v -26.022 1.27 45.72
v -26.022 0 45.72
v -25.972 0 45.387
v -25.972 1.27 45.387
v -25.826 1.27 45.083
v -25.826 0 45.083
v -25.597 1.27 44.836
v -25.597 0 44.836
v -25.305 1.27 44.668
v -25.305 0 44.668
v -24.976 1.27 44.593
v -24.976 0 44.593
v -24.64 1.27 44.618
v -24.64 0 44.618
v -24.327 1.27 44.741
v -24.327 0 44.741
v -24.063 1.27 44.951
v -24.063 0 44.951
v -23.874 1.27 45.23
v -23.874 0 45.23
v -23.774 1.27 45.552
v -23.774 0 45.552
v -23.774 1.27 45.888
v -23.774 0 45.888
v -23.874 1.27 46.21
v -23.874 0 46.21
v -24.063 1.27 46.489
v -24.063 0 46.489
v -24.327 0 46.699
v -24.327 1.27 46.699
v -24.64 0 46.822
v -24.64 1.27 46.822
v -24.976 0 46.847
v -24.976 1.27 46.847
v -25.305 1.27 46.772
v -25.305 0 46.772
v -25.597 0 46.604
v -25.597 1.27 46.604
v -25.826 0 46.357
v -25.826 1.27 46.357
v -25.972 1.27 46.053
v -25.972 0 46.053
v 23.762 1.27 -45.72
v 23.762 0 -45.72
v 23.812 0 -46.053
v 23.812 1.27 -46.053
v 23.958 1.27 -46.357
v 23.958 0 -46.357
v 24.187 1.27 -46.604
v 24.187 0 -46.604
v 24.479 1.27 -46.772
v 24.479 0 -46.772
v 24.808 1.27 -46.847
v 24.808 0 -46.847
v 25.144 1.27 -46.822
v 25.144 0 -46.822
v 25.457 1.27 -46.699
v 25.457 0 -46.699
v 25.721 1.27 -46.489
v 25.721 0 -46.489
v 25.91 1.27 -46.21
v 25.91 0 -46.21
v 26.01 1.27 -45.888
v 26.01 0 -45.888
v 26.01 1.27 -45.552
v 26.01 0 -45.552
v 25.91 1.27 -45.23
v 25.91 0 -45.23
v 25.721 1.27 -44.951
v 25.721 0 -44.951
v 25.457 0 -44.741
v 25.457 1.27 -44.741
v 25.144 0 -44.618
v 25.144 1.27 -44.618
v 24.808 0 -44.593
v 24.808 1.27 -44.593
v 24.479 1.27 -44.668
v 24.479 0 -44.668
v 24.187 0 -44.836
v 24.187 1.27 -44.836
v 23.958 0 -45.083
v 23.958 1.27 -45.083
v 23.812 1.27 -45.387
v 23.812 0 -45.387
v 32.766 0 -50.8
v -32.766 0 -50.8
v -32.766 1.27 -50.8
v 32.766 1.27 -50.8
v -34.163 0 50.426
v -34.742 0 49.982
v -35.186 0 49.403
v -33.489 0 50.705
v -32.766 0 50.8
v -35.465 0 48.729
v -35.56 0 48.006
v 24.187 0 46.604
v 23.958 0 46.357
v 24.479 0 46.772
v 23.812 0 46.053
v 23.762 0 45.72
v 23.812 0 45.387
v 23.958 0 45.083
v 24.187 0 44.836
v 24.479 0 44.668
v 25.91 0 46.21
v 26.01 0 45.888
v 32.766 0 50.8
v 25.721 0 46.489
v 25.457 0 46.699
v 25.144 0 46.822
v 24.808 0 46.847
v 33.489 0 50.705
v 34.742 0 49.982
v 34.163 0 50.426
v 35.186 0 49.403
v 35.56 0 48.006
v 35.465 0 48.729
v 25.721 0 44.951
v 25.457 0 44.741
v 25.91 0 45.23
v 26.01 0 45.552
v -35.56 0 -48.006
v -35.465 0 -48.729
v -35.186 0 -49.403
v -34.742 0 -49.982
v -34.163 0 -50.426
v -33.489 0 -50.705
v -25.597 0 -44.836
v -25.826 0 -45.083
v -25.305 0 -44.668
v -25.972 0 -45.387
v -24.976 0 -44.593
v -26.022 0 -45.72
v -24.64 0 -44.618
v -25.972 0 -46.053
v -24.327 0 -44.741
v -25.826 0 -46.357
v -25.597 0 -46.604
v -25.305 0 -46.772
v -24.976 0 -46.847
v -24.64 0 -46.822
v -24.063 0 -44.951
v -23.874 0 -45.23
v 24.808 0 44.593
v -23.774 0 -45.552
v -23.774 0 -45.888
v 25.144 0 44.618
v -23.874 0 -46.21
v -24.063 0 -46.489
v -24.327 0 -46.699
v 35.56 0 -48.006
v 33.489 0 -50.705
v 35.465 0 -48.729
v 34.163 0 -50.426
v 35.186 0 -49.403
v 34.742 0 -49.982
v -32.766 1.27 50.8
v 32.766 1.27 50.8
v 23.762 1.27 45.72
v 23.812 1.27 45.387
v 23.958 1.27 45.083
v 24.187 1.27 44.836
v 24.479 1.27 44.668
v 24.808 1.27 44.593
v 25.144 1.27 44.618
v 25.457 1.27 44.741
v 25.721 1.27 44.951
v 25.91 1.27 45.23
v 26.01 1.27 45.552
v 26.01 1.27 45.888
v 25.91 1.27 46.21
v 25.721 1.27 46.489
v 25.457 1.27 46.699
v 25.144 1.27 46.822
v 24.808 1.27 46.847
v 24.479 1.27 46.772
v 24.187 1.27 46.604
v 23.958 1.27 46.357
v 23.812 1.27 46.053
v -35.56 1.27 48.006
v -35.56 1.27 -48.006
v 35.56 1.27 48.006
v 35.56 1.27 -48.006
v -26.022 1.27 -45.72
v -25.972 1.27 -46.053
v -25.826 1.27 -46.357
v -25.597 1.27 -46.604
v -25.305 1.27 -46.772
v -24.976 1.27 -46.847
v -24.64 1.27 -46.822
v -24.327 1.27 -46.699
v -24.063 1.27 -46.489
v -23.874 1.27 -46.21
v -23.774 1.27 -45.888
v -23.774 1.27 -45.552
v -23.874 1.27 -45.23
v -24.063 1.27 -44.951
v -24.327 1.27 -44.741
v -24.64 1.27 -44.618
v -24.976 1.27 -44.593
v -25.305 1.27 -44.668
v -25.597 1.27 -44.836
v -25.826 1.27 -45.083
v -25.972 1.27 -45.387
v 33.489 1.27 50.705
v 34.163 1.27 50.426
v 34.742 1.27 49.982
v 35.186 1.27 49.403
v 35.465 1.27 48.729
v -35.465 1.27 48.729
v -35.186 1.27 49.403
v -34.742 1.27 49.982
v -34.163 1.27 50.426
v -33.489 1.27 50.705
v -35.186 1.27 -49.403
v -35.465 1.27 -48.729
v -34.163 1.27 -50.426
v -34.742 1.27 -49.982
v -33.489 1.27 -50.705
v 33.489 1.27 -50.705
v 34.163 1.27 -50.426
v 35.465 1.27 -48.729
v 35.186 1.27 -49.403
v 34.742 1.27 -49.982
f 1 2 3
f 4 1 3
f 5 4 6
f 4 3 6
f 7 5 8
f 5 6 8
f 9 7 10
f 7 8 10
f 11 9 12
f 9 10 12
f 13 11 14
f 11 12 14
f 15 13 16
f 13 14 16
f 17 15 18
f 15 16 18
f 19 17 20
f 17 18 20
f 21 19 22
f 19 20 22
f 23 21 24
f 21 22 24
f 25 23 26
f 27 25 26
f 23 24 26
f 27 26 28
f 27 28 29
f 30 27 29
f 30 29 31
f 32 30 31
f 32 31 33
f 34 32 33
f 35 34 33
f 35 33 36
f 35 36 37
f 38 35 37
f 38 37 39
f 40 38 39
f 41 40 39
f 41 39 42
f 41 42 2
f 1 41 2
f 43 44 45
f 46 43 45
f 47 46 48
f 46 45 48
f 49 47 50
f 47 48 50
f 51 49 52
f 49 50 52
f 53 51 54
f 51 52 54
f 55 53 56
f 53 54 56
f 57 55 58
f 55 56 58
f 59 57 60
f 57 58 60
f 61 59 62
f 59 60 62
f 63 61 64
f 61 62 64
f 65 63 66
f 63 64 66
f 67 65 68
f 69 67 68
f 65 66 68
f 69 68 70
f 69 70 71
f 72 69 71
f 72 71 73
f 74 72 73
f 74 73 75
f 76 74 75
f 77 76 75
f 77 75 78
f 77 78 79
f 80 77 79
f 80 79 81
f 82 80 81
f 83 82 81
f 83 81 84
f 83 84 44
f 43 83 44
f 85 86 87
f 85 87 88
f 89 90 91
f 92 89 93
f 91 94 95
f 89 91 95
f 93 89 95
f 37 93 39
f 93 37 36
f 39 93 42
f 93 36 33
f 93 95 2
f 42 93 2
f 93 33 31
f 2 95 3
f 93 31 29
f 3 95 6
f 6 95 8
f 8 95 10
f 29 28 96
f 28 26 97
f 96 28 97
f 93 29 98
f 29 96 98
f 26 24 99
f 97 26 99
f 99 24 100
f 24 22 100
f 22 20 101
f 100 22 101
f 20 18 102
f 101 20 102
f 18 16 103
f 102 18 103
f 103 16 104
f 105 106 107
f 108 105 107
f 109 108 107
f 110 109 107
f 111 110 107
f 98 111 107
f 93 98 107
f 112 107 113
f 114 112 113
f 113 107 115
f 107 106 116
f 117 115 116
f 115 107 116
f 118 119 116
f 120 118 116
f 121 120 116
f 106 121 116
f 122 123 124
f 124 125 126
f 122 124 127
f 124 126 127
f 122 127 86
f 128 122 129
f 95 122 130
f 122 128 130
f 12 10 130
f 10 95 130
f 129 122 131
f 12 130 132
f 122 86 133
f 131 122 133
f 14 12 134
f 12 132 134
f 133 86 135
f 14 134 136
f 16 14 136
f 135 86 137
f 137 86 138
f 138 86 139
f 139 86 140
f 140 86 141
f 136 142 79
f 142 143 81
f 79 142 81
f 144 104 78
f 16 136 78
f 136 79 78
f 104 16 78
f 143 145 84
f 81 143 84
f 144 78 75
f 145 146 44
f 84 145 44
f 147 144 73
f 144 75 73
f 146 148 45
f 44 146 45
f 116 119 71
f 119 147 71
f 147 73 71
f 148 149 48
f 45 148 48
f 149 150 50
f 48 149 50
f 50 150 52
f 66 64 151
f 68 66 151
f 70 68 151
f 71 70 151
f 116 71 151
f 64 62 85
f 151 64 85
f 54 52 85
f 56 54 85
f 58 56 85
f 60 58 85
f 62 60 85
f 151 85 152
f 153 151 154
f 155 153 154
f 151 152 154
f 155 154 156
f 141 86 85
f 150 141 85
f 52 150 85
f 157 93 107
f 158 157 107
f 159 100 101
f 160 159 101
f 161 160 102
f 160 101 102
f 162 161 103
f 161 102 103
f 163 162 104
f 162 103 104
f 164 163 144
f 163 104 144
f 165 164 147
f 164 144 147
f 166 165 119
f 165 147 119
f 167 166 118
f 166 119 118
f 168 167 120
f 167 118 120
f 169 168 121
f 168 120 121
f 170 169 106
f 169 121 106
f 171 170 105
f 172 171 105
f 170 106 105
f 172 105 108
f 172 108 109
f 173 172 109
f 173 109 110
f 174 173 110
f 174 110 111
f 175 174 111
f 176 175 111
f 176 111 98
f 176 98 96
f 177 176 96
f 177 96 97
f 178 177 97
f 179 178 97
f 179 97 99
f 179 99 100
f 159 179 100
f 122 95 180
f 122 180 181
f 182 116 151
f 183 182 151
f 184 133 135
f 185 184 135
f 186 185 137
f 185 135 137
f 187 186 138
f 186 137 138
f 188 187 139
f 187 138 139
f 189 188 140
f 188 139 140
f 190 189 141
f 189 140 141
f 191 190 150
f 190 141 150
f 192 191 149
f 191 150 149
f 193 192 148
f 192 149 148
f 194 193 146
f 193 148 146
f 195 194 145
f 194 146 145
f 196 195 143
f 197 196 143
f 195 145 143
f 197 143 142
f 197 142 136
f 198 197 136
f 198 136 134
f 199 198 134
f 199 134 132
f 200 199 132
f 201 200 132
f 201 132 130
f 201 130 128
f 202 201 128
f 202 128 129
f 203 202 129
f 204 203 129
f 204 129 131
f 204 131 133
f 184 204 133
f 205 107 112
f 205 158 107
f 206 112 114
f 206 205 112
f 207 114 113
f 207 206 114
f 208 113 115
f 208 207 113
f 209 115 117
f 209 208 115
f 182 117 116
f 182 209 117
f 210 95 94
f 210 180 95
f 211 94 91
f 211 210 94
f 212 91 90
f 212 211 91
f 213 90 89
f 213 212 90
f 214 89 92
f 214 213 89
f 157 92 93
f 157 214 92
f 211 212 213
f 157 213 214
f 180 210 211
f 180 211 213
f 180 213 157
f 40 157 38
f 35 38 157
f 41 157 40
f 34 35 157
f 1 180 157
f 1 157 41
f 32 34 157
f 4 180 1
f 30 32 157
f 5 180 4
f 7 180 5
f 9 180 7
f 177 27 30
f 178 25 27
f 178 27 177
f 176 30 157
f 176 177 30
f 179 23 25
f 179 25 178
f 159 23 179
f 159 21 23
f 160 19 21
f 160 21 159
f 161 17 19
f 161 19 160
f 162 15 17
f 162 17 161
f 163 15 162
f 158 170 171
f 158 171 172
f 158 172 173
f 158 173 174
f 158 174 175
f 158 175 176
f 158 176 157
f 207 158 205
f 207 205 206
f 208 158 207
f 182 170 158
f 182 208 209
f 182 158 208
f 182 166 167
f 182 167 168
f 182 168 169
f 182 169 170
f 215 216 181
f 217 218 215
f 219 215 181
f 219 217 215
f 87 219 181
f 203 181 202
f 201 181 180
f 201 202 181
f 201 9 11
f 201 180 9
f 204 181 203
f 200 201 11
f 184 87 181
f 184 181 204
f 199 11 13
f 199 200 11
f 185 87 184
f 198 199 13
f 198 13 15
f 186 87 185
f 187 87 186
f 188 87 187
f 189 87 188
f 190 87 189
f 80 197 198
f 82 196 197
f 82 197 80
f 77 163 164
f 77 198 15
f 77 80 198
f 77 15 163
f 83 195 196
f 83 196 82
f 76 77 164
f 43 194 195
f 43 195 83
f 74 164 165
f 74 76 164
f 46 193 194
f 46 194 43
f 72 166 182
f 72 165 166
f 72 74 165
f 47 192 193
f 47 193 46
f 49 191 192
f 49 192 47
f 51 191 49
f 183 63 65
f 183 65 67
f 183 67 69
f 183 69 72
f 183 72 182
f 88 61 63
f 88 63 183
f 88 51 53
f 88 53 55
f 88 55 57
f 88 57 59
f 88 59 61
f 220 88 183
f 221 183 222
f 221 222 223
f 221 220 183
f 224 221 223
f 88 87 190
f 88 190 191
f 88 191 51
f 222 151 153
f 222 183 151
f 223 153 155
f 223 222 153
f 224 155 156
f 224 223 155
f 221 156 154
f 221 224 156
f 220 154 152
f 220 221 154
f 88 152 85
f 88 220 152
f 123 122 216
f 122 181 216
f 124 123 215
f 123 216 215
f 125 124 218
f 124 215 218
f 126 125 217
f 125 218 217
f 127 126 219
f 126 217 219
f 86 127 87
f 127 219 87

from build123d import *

# Parameters (mm, degrees)
SKETCH1_W                 = 71.12
SKETCH1_H                 = 101.6
BOSS_EXTRUDE1_DEPTH       = 1.27
FILLET1_R                 = 2.794
F_4_40_TAPPED_HOLE1_D     = 2.2606
F_4_40_TAPPED_HOLE1_DEPTH = 2.286
F_4_40_TAPPED_HOLE1_TIP   = 0.679152758


with BuildPart() as part:
    # Sketch1 → Boss-Extrude1 (new body)
    with BuildSketch(Plane(origin=(0, 0, 0), x_dir=(1, 0, 0), z_dir=(0, 1, 0))):
        Rectangle(SKETCH1_W, SKETCH1_H)
    extrude(amount=BOSS_EXTRUDE1_DEPTH)

    # Fillet1
    fillet1_edges = [part.edges().sort_by_distance(p)[0] for p in [
        (35.56, 0.635, 50.8),
        (-35.56, 0.635, 50.8),
        (-35.56, 0.635, -50.8),
        (35.56, 0.635, -50.8),
    ]]
    fillet(fillet1_edges, radius=FILLET1_R)

    # #4-40 Tapped Hole1
    with Locations(Plane(origin=(0, 1.27, 0), x_dir=(1, 0, 0), z_dir=(0, 1, 0))):
        with Locations((-24.892, 45.72), (24.892, 45.72), (-24.892, -45.72), (24.892, -45.72)):
            Hole(F_4_40_TAPPED_HOLE1_D / 2, depth=F_4_40_TAPPED_HOLE1_DEPTH)
            with Locations((0, 0, -(F_4_40_TAPPED_HOLE1_DEPTH + F_4_40_TAPPED_HOLE1_TIP / 2))):  # 118° drill point
                Cone(0, F_4_40_TAPPED_HOLE1_D / 2, F_4_40_TAPPED_HOLE1_TIP, mode=Mode.SUBTRACT)


solid = part.part
